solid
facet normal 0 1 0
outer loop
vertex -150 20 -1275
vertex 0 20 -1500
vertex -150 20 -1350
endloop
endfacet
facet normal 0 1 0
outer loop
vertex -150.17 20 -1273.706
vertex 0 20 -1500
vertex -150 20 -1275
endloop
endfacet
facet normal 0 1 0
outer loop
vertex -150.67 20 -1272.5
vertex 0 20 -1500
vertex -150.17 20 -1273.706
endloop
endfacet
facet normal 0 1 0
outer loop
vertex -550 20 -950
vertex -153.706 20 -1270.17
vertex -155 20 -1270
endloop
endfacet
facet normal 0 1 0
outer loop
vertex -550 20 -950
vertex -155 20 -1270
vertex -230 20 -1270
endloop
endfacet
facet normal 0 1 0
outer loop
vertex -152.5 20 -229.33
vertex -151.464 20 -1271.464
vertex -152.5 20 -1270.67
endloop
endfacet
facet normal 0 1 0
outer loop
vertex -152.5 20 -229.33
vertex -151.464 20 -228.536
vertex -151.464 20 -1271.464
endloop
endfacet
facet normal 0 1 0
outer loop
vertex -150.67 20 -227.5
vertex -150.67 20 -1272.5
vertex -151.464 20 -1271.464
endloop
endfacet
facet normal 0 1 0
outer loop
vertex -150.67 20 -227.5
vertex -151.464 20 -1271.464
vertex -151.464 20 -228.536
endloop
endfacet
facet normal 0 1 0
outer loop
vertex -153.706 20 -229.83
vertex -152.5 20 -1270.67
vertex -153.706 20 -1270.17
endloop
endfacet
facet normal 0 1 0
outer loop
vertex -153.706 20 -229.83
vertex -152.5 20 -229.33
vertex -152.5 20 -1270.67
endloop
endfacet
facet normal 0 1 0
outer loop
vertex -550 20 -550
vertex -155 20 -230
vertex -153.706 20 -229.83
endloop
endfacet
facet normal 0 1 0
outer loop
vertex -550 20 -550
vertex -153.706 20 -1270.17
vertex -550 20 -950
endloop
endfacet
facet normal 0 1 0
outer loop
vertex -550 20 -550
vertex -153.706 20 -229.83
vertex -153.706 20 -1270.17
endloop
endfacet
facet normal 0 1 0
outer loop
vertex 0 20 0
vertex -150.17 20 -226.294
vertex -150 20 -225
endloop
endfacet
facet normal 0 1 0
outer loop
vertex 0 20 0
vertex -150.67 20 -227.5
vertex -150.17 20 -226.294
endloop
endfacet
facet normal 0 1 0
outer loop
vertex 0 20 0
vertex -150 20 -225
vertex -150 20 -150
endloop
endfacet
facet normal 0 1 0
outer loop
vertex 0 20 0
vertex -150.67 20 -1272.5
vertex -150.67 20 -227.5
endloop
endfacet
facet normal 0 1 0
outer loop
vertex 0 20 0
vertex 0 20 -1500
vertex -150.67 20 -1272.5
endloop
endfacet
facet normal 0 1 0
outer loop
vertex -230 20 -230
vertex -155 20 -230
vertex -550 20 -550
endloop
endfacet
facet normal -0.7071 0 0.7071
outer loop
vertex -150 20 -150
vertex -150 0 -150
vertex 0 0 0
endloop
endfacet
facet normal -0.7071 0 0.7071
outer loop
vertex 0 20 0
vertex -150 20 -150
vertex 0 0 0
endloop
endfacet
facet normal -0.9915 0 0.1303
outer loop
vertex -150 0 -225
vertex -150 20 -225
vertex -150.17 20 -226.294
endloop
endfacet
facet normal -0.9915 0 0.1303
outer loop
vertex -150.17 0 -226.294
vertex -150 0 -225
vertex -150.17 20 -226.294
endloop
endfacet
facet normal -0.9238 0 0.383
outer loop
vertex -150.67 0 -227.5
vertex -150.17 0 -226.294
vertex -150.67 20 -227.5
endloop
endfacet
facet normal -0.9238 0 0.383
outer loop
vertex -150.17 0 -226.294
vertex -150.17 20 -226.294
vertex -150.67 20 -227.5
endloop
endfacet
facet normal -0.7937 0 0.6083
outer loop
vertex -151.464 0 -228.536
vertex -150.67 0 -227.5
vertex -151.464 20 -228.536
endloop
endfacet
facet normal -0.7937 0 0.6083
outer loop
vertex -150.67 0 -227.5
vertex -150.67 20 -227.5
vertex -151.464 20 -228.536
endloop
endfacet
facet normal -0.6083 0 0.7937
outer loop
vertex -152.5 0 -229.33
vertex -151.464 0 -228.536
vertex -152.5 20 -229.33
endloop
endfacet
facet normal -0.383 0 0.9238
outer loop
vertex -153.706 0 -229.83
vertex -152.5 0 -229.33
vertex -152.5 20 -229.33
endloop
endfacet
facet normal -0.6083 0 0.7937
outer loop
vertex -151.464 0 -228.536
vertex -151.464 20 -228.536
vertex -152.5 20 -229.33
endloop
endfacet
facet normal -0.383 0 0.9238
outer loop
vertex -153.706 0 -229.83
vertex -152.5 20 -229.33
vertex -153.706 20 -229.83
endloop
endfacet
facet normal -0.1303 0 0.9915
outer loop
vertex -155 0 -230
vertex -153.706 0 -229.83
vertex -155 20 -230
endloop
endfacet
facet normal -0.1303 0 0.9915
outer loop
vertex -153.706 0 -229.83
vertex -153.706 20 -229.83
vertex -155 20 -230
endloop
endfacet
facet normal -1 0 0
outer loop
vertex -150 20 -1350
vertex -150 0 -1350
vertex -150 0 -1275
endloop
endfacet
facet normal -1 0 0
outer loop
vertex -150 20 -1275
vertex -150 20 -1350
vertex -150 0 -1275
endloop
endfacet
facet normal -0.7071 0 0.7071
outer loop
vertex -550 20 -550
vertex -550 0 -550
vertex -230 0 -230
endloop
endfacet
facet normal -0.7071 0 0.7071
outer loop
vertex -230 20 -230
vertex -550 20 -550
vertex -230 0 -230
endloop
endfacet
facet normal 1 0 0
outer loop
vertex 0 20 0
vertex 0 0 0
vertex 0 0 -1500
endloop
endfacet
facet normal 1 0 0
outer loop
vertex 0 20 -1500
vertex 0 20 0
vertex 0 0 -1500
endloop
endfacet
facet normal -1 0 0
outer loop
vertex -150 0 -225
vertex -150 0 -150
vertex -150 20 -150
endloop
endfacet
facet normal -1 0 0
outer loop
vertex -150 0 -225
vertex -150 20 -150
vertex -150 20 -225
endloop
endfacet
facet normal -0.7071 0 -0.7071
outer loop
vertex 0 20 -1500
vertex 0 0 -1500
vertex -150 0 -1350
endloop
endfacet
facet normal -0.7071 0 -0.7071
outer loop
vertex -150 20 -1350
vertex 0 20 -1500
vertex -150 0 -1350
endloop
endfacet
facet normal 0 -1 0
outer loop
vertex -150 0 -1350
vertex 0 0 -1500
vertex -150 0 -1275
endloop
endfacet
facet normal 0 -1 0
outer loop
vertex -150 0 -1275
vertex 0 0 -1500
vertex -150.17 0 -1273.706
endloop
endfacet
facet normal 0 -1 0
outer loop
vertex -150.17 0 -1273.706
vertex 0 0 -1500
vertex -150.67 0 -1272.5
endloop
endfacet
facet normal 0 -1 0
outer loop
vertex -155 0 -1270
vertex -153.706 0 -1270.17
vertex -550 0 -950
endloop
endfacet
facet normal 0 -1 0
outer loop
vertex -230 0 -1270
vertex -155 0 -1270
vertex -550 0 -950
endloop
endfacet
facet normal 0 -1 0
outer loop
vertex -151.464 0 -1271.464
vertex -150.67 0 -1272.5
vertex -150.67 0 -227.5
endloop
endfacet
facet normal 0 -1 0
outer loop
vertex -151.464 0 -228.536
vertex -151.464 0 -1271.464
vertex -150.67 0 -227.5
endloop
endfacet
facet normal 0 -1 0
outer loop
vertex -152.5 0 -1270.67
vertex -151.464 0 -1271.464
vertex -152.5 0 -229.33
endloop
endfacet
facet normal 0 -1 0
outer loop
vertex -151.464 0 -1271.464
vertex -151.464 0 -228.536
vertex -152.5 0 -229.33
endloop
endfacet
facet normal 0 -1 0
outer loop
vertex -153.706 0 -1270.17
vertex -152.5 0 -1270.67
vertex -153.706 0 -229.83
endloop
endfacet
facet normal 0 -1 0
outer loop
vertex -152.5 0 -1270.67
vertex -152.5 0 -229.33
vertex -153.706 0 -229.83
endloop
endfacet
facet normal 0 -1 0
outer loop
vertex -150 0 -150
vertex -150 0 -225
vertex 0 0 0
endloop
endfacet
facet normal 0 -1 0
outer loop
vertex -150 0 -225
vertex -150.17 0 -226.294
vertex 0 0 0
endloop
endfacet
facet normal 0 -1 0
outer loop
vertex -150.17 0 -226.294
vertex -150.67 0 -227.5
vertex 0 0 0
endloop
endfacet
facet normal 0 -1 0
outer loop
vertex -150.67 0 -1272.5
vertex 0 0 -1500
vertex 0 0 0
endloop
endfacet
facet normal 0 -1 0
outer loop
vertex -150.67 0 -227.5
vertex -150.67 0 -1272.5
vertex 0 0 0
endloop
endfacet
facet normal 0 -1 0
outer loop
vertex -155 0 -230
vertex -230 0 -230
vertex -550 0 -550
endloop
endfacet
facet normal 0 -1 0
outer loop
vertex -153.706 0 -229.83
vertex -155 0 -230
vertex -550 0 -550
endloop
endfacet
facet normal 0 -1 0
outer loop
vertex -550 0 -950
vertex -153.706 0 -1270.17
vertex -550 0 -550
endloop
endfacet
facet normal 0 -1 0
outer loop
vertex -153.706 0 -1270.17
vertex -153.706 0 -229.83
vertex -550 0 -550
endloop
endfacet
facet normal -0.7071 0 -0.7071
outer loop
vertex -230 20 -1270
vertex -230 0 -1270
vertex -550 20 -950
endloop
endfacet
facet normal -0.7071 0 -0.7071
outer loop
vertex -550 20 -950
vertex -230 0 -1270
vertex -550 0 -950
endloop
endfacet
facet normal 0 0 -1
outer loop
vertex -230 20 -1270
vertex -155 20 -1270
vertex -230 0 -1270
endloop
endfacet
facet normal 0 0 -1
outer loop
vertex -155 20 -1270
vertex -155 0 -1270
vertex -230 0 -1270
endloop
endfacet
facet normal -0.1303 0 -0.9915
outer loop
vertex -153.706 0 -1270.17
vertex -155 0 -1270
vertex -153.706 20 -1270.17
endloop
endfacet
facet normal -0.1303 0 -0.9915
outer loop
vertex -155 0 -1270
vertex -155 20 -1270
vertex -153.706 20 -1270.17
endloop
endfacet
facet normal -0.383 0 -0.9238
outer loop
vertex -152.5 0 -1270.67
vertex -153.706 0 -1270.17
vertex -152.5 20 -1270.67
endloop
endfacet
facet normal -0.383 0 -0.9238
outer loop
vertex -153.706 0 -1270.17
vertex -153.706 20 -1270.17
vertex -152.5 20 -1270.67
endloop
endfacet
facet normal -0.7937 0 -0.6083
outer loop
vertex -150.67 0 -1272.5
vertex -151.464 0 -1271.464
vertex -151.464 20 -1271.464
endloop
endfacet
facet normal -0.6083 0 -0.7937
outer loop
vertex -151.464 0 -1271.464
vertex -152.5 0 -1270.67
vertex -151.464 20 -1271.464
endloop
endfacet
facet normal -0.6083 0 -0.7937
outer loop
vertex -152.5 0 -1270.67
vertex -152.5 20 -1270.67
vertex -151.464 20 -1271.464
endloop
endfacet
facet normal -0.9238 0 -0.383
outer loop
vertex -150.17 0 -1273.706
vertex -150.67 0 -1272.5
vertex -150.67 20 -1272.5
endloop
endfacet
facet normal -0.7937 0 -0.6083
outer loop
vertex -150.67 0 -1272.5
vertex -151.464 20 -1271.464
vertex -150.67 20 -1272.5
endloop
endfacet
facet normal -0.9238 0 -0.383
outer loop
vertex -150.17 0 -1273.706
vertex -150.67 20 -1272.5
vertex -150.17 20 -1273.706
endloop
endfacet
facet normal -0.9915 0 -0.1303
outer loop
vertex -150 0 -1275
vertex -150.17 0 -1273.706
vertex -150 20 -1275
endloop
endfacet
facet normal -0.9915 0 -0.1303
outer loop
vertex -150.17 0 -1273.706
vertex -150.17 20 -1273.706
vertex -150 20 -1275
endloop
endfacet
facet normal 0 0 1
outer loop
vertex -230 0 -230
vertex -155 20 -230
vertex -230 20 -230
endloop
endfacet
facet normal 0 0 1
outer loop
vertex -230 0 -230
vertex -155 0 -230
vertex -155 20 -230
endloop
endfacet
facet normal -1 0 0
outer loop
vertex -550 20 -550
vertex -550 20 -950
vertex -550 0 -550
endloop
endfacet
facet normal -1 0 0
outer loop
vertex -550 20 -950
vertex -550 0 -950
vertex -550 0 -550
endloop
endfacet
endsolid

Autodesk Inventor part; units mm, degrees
ref_plane "YZ Plane" through (0, 0, 0) normal (1, 0, 0) x (0, 1, 0)
ref_plane "XZ Plane" through (0, 0, 0) normal (0, 1, 0) x (-1, 0, 0)
ref_plane "XY Plane" through (0, 0, 0) normal (0, 0, 1) x (1, 0, 0)
sketch "Sketch4" plane through (0, 0, 0) normal (0, 1, 0) x (-1, 0, 0)
  line L0 (0, 0) -> (0, -1500)
  line L1 (550, -950) -> (550, -550)
  line L2 (150, -150) -> (150, -230)
  line L3 (150, -230) -> (230, -230)
  line L4 (550, -550) -> (230, -230)
  line L5 (150, -150) -> (0, 0)
  line L6 (150, -1350) -> (150, -1270)
  line L7 (150, -1270) -> (230, -1270)
  line L8 (0, -1500) -> (150, -1350)
  line L9 (230, -1270) -> (550, -950)
  dimension "d8" = 1500
  dimension "d11" = 550
  dimension "d12" = 80
  dimension "d13" = 150
  dimension "d14" = 150
  dimension "d15" = 80
  dimension "d16" = 45
extrude "Extrusion1" add sketch "Sketch4" along normal blind 20
fillet "Fillet1" radius 5 1 edges at (-150, 10, -230)
fillet "Fillet2" radius 5 1 edges at (-150, 10, -1270)
properties part number "top long"
